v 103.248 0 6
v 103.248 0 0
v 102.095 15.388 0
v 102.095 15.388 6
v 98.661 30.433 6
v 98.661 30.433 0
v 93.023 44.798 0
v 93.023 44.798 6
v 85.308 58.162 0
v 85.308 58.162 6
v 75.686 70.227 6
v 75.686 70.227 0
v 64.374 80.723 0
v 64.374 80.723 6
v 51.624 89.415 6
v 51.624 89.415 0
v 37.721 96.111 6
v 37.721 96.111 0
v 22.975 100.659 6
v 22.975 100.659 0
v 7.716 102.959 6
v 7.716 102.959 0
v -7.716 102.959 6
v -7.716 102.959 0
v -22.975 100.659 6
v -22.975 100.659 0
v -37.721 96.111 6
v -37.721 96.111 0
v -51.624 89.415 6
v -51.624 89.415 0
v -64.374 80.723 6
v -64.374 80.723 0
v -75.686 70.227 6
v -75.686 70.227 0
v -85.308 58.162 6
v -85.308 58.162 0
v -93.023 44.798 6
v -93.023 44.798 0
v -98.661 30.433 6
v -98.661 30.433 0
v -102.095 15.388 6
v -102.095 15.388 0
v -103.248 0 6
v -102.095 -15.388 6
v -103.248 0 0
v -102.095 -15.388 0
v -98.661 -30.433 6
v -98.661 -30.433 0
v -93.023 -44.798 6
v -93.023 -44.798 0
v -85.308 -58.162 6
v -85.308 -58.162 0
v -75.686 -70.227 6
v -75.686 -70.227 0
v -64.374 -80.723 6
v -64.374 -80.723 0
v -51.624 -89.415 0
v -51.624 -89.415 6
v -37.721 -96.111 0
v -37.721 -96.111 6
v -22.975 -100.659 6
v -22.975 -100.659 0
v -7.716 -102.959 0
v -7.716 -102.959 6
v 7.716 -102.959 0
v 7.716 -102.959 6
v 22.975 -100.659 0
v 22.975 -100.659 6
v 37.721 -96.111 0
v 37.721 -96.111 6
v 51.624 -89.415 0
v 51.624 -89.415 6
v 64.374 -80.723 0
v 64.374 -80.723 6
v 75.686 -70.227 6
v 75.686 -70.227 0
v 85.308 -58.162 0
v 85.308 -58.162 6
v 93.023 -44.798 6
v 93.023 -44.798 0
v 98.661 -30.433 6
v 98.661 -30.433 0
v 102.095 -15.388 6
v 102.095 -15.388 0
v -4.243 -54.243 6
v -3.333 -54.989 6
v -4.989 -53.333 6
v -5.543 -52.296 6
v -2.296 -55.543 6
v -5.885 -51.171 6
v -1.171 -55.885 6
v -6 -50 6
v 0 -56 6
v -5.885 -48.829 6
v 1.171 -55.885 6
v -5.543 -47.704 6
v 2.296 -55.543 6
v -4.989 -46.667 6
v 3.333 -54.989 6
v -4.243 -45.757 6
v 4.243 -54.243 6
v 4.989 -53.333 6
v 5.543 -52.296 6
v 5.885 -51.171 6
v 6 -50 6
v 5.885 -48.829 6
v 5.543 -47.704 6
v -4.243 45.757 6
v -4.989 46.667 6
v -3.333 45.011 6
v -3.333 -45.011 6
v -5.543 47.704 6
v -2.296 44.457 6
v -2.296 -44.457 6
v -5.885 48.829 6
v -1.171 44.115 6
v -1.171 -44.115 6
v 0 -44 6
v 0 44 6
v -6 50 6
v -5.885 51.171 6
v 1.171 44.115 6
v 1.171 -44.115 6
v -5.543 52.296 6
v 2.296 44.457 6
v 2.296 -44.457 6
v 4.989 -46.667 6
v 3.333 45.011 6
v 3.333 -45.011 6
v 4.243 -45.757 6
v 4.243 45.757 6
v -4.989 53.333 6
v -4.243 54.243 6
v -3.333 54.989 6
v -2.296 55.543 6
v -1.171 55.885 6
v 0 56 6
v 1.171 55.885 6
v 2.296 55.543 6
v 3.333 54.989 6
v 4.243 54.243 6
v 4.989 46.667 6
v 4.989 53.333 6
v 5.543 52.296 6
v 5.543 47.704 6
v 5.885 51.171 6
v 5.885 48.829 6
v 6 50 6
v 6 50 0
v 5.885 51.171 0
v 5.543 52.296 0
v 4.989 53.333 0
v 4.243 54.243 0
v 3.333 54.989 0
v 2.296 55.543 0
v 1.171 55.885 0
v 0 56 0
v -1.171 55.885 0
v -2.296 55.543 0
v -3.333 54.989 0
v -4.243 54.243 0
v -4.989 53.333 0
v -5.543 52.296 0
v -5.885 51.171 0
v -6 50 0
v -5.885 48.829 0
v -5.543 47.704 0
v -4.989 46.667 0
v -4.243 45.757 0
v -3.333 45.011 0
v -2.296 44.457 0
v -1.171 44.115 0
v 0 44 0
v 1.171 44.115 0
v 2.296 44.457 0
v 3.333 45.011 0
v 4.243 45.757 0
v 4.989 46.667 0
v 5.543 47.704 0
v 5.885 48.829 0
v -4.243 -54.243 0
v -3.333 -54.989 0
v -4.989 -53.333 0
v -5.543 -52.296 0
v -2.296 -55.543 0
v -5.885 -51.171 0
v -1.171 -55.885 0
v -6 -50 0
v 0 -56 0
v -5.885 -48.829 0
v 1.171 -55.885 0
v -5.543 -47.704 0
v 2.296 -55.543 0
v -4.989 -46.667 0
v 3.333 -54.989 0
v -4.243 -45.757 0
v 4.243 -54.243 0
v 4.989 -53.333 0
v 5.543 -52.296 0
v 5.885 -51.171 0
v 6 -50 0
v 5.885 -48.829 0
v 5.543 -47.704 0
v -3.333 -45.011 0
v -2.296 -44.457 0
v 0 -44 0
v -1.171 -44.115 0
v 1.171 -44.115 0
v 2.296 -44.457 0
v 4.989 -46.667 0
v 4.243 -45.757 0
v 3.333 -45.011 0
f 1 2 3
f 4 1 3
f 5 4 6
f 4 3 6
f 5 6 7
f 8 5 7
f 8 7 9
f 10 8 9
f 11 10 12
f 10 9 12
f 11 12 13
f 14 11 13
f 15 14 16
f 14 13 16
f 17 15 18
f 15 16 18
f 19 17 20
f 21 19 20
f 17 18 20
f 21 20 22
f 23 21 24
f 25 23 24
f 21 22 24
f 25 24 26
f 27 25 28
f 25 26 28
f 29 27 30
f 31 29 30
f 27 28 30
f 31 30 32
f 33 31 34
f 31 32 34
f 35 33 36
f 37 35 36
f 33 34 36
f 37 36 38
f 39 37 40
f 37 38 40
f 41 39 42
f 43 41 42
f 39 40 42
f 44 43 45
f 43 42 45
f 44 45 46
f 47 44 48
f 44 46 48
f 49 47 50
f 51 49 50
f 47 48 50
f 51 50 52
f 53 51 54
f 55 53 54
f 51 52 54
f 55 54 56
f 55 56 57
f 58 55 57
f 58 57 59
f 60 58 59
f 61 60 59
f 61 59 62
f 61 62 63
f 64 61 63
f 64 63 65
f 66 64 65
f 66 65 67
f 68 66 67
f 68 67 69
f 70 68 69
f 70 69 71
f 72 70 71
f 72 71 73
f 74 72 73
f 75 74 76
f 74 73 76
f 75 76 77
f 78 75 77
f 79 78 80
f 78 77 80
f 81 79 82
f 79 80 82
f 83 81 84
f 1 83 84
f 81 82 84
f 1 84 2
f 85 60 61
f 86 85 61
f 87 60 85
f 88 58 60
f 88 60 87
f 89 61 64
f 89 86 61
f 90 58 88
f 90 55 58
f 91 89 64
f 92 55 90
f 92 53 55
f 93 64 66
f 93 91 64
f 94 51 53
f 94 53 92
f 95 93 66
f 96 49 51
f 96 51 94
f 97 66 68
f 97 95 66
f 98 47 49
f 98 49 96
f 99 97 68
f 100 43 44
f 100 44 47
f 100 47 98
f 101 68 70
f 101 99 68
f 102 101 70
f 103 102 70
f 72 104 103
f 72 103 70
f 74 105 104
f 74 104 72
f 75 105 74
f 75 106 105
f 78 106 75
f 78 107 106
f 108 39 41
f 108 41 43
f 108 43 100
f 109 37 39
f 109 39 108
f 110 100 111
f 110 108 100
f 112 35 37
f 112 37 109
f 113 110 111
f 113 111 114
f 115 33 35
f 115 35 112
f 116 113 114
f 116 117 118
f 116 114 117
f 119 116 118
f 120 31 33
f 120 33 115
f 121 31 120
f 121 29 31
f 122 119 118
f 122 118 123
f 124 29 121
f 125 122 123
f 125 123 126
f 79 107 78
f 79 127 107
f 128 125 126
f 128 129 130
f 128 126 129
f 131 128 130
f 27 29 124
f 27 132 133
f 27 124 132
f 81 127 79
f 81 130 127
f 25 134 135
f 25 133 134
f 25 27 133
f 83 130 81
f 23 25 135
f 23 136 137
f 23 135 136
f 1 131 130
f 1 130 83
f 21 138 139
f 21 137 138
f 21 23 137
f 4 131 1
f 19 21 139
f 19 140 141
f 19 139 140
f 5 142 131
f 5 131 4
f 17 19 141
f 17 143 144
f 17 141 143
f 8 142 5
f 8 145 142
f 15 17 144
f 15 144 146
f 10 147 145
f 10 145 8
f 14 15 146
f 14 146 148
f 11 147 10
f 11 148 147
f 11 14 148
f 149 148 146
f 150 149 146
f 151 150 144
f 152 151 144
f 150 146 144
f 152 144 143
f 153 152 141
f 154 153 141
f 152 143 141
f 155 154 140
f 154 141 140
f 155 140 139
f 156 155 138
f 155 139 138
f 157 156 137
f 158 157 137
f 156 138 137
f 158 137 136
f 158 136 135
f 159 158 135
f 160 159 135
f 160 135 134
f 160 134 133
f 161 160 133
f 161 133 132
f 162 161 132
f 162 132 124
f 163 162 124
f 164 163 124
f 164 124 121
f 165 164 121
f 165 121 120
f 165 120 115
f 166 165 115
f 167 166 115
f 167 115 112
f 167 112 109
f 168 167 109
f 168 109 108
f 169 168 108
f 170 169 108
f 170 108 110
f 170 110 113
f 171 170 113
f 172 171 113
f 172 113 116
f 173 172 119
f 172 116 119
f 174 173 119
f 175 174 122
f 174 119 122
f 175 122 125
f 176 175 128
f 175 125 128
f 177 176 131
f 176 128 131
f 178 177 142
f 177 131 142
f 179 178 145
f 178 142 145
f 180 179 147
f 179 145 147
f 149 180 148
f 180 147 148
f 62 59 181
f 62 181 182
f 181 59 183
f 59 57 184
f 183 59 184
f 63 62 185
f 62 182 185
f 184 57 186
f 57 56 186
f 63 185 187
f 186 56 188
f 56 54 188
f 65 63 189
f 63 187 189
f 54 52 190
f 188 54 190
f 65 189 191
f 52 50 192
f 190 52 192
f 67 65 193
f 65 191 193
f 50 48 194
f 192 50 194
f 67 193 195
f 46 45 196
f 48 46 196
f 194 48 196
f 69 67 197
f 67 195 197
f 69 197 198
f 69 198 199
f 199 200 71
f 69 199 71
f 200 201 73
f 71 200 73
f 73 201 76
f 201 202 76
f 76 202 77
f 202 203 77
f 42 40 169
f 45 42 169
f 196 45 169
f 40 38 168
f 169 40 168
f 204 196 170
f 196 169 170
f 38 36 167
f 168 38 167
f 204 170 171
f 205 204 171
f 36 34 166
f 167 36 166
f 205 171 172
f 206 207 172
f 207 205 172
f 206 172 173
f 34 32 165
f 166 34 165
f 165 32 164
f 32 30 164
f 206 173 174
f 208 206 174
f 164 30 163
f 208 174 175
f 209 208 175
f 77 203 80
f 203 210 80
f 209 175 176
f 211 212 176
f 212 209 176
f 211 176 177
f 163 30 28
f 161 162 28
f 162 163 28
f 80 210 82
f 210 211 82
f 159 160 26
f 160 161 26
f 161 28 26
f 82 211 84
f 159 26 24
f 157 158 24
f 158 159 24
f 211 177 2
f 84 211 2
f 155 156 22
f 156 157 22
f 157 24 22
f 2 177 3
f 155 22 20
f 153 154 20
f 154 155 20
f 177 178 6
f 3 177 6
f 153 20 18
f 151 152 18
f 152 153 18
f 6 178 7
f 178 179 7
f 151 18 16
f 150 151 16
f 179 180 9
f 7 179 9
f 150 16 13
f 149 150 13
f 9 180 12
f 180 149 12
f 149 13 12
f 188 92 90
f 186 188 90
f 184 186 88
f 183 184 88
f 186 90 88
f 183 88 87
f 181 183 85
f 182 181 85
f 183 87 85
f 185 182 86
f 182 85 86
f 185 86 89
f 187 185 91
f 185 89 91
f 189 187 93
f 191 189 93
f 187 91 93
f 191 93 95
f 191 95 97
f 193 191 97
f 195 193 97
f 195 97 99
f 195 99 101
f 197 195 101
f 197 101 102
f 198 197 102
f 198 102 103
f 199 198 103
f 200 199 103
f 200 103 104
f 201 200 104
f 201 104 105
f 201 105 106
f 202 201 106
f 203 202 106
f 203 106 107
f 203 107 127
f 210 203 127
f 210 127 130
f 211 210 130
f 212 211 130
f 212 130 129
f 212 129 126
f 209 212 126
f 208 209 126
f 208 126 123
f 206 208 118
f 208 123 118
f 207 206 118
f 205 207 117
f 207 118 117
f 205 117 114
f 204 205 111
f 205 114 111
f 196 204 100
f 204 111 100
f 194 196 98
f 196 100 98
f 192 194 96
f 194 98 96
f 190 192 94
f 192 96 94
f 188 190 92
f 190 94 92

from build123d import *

# Parameters (mm, degrees)
SKETCH_R           = 103.248116
PAD_DEPTH          = 6
SKETCH001_R        = 6
POCKET_DEPTH       = 590.183803
POLARPATTERN_COUNT = 2


with BuildPart() as part:
    # Sketch → Pad (new body)
    with BuildSketch(Plane.XY):
        Circle(SKETCH_R)
    extrude(amount=PAD_DEPTH)

    # Sketch001 (on Face3 of Pad) → Pocket (cut, through all)
    with BuildSketch(Plane.XY.offset(6)):
        with Locations((0, 50)):
            Circle(SKETCH001_R)
    pocket = extrude(amount=-POCKET_DEPTH, mode=Mode.SUBTRACT)

    # PolarPattern: Pocket ×2 about axis
    polarpattern_axis = Axis((0, 0, 6), (0, 0, 1))
    for i in range(1, POLARPATTERN_COUNT):
        add(pocket.rotate(polarpattern_axis, i * 360 / POLARPATTERN_COUNT), mode=Mode.SUBTRACT)


solid = part.part
